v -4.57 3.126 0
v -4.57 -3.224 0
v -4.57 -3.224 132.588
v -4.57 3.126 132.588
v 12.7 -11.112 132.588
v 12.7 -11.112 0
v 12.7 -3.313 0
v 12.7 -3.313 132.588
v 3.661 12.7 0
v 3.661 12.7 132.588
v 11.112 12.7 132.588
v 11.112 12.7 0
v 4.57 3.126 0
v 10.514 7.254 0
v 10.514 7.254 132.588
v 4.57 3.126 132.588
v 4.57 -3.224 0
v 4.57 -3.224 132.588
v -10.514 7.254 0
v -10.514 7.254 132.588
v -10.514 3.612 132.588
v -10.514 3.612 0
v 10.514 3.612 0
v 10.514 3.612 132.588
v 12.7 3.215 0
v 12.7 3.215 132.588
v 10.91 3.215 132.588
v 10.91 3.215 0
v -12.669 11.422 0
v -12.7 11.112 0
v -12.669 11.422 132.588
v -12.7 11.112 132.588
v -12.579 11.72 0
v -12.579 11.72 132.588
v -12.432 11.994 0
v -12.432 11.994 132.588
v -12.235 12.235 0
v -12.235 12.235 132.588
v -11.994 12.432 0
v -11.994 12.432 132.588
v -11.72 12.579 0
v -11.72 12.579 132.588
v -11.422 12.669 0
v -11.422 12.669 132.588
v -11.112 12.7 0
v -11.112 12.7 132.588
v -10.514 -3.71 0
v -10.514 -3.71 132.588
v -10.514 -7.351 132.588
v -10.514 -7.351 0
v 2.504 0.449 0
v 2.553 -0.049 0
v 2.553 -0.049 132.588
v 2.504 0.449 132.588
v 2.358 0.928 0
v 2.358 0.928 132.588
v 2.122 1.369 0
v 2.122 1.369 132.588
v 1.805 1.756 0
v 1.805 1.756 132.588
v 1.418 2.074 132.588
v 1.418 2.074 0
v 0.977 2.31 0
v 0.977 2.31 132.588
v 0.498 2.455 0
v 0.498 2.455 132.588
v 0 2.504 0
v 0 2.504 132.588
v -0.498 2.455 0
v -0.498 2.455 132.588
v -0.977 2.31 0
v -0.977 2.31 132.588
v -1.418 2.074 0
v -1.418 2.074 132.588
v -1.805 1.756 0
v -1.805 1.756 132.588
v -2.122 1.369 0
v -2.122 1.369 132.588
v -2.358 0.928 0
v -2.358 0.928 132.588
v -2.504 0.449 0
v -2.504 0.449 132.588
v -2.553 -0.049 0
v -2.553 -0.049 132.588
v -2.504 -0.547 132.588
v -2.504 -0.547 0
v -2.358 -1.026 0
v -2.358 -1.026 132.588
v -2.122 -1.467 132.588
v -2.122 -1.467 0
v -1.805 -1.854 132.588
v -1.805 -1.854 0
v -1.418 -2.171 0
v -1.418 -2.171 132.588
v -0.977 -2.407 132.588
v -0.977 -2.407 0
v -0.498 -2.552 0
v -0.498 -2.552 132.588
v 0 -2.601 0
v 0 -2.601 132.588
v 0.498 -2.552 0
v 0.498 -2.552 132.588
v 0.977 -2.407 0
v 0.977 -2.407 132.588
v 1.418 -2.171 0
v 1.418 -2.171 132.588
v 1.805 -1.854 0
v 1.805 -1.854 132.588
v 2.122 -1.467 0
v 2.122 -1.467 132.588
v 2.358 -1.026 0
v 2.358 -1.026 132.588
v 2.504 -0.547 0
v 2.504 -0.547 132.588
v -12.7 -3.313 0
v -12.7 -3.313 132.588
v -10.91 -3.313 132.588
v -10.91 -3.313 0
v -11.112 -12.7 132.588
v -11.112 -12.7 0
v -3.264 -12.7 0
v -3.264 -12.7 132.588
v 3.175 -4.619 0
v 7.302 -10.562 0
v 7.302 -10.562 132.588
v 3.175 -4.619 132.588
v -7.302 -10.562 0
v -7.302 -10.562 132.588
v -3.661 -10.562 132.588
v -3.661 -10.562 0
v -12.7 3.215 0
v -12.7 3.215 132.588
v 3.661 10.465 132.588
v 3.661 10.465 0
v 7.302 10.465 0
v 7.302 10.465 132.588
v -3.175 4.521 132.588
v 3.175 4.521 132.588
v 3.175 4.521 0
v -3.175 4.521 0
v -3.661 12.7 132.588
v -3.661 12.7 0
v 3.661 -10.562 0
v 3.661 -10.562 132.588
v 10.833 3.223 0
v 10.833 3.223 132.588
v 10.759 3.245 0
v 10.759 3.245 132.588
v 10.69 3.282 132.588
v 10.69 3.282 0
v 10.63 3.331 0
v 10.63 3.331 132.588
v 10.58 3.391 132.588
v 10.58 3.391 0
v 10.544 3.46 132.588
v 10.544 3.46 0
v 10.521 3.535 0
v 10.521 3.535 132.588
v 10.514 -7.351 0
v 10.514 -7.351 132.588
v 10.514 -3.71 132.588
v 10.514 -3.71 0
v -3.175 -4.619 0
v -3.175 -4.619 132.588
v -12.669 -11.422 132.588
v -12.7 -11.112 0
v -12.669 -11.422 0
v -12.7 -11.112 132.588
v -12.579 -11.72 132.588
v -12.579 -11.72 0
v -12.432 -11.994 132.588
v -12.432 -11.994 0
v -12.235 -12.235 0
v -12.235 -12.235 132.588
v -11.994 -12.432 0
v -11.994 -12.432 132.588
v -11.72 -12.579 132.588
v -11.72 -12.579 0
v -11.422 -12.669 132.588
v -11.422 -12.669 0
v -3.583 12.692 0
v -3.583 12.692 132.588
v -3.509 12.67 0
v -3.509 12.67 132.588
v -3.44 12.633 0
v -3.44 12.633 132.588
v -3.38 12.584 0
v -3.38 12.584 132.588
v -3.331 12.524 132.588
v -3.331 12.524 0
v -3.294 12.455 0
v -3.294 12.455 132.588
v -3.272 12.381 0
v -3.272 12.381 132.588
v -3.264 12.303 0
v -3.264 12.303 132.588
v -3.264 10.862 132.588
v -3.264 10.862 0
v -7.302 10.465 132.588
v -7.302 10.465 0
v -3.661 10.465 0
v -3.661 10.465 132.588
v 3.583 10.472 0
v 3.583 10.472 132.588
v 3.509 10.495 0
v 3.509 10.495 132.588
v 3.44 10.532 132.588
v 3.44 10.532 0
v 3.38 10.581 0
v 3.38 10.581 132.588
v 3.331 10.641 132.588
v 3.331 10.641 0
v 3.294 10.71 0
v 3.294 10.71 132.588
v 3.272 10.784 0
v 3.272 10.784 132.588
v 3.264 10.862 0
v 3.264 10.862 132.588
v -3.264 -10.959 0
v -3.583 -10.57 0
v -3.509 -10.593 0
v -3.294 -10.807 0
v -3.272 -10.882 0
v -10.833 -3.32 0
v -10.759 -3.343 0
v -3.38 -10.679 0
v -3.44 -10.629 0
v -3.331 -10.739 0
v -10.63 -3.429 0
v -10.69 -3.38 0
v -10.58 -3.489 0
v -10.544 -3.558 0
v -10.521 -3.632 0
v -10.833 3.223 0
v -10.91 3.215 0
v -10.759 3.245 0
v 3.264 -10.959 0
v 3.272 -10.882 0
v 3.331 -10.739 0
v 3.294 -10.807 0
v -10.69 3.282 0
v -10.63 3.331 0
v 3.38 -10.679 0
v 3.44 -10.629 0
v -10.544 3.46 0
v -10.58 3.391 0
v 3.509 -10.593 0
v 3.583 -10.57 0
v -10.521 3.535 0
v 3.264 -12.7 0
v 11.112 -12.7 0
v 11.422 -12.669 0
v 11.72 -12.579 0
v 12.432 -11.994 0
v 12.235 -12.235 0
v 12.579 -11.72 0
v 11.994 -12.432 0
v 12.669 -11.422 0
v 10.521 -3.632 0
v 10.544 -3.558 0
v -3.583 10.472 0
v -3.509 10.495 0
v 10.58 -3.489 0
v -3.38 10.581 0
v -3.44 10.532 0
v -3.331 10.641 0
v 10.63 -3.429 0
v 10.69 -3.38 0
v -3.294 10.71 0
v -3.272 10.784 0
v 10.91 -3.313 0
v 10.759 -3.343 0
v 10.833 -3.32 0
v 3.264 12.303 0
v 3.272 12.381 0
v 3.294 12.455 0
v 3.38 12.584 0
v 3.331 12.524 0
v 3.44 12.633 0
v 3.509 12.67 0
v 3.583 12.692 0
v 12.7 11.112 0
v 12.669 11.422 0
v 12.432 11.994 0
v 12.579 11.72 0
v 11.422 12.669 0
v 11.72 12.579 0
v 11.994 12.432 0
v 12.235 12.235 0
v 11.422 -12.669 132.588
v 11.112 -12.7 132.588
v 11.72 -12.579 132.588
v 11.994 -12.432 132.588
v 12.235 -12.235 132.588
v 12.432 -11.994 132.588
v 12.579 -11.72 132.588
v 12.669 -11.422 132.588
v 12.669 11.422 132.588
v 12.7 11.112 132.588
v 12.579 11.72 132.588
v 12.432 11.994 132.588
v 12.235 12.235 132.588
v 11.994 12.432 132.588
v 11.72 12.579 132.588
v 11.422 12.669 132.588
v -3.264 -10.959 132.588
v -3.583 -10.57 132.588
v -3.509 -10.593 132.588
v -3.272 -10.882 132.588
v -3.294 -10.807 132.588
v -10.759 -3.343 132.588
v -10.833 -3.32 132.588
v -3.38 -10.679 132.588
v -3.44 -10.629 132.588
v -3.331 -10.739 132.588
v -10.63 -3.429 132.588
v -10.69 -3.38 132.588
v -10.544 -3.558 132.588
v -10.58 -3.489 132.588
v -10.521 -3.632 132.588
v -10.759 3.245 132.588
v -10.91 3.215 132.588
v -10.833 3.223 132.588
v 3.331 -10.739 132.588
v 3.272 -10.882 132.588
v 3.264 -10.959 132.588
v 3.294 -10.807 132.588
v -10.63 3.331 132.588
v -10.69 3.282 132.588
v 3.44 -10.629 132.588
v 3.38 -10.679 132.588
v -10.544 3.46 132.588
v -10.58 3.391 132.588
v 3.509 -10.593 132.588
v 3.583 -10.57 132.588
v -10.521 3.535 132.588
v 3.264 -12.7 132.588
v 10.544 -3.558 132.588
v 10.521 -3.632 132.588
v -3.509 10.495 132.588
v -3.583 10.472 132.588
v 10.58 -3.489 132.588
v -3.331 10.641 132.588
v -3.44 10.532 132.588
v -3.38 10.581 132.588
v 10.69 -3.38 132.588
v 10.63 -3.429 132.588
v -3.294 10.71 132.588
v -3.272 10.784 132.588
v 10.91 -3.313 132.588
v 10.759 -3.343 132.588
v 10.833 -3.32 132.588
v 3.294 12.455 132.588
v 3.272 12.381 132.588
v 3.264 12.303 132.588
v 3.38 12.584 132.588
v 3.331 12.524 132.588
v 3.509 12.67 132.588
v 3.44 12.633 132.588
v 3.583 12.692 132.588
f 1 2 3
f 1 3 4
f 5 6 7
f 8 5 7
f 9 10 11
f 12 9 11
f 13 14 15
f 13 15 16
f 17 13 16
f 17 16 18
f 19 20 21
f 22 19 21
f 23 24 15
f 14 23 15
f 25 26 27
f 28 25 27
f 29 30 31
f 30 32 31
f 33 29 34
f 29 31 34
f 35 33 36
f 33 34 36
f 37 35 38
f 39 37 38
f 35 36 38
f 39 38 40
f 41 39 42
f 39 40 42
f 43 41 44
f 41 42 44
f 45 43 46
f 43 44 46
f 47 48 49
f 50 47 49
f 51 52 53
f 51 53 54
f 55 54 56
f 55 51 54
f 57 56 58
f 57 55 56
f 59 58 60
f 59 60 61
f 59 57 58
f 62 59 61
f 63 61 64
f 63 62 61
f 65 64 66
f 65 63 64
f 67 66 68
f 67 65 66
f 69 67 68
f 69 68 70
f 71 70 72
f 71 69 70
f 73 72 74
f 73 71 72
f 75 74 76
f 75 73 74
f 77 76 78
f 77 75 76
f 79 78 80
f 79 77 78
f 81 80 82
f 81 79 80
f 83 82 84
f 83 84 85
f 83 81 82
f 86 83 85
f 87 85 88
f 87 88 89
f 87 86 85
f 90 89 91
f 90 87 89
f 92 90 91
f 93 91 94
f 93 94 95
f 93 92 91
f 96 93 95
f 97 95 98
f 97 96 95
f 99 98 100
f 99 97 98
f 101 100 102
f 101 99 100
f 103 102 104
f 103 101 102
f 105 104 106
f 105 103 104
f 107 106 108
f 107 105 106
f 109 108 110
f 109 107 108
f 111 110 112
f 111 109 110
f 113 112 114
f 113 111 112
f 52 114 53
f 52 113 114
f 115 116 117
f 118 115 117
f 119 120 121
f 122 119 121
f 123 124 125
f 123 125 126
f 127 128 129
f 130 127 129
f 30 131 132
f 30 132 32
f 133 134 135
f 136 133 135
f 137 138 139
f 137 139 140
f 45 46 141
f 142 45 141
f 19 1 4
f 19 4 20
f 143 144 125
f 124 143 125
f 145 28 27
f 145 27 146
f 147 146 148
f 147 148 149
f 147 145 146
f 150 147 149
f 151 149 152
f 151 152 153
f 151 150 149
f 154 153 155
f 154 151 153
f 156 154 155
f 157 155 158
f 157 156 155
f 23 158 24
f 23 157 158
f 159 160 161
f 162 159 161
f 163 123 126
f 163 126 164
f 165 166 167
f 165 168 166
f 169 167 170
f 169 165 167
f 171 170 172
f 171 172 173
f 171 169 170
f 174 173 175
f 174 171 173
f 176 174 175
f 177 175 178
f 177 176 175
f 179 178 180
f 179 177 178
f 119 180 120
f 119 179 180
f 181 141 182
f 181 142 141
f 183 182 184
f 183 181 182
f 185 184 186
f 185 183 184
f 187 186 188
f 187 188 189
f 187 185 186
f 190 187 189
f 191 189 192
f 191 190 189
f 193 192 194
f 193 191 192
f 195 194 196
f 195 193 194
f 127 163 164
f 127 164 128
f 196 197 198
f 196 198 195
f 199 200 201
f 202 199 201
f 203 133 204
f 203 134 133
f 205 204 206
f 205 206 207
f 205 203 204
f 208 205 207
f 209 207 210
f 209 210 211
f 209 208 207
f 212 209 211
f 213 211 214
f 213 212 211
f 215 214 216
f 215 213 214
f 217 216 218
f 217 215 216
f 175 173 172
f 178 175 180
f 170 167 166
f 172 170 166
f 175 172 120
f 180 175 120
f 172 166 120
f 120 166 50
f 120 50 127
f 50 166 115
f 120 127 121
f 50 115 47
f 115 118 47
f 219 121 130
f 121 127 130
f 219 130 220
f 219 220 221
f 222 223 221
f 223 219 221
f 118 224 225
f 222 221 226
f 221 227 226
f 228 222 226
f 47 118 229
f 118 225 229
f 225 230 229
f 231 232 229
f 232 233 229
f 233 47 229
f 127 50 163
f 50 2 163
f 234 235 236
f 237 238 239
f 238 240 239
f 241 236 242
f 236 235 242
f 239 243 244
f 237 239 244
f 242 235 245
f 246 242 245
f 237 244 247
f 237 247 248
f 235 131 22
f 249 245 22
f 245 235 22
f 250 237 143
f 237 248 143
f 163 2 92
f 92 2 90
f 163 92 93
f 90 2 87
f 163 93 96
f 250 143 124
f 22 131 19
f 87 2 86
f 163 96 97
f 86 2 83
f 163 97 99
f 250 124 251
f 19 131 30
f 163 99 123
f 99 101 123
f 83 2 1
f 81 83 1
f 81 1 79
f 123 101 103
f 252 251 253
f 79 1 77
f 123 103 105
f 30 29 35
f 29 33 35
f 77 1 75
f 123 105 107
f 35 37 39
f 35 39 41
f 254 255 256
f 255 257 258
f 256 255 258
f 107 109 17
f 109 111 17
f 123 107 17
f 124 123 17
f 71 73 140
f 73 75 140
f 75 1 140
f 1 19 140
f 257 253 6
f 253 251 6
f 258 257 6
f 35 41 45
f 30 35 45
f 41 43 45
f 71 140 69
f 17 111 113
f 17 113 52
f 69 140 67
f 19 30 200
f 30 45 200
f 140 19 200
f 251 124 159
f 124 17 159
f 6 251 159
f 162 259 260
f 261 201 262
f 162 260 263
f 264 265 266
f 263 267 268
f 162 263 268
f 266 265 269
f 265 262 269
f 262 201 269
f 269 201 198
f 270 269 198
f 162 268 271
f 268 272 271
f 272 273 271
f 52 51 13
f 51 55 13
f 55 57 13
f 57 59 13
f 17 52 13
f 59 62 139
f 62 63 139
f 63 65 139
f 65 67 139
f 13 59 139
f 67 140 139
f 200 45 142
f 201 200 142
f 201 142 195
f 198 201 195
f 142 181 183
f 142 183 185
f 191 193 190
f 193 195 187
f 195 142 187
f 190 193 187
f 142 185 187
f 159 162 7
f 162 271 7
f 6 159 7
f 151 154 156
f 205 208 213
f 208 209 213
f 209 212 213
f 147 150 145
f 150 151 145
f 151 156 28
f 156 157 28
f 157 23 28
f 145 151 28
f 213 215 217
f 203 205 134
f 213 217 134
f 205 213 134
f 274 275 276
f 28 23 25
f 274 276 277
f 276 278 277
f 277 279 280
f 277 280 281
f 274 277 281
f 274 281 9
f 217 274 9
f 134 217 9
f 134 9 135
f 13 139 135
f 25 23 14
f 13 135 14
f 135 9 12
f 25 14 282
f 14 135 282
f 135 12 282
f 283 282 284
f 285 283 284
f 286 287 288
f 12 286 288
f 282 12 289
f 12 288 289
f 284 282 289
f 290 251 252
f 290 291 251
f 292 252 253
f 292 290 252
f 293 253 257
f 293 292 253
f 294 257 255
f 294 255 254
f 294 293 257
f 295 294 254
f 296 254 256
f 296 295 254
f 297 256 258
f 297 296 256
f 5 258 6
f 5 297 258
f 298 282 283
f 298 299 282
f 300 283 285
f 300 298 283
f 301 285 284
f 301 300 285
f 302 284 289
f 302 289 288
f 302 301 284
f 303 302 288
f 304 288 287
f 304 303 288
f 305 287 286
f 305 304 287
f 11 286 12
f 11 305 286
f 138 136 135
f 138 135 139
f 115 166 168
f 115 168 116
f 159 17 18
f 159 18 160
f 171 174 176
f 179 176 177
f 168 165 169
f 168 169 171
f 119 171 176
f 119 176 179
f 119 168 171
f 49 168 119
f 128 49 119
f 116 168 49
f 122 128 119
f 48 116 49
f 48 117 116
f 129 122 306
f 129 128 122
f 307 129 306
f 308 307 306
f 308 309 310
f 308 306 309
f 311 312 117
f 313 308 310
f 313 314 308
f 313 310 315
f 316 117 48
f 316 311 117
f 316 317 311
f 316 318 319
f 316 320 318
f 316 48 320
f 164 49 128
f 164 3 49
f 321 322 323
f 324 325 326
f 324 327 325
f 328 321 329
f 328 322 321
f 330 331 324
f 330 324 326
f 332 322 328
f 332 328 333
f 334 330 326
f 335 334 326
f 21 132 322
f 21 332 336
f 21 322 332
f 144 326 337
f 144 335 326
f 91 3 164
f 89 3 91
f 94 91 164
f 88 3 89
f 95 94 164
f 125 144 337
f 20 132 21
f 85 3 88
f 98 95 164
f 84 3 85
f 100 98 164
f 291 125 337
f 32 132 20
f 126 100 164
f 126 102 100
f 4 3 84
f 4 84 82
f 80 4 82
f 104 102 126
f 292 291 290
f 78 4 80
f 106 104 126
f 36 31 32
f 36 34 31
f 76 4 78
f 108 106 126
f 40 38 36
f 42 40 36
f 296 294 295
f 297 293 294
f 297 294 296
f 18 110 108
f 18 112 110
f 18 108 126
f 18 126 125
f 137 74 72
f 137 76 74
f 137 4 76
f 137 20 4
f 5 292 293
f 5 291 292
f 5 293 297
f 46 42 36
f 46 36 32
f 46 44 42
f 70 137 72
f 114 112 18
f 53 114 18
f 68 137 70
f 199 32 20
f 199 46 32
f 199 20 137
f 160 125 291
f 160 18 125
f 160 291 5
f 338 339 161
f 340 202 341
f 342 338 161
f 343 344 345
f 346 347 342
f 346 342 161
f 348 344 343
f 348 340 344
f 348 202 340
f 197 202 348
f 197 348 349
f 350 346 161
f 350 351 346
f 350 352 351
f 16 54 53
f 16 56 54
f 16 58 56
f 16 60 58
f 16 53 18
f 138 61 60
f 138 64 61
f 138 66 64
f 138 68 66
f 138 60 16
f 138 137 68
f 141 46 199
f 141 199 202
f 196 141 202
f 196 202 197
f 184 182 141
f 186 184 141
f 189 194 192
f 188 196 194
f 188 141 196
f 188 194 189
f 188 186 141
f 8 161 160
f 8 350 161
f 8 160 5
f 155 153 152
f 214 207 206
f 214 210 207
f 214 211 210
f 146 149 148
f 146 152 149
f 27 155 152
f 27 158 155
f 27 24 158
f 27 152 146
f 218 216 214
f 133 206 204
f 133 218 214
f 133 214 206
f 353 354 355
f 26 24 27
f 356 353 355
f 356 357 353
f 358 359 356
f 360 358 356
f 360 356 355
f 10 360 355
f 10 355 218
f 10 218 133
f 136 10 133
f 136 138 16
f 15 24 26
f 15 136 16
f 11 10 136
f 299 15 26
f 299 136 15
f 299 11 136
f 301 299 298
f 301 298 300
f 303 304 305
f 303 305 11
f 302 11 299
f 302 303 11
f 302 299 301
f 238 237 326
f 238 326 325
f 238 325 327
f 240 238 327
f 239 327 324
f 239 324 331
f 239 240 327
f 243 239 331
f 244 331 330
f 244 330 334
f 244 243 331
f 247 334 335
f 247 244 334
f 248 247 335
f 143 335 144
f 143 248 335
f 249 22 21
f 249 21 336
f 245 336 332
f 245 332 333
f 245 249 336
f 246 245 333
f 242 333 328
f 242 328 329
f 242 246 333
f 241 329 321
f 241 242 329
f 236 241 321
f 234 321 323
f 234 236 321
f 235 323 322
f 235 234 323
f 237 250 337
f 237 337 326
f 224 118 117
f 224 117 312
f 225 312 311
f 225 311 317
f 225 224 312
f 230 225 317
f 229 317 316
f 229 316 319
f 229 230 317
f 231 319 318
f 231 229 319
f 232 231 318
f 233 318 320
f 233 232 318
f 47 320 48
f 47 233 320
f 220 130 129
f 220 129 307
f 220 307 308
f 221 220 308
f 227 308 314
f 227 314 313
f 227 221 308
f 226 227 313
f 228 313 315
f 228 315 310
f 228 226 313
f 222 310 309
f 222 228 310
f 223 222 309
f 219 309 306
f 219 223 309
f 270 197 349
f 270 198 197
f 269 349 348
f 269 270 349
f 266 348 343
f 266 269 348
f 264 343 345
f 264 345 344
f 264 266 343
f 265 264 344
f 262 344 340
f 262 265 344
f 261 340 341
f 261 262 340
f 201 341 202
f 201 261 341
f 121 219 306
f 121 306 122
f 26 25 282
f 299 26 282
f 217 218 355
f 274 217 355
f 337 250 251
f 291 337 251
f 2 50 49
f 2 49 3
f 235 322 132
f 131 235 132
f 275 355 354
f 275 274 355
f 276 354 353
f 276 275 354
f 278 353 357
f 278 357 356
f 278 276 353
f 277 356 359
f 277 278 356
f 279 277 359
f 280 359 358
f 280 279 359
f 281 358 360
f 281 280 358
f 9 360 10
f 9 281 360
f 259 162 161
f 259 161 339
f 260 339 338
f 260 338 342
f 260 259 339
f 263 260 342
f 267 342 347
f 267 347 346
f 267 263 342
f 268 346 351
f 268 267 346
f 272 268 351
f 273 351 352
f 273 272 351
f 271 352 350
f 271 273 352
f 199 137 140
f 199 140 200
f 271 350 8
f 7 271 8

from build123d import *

# Parameters (mm, degrees)
SKETCH1_W           = 25.4
SKETCH1_H           = 25.4
BOSS_EXTRUDE1_DEPTH = 132.588
FILLET1_R           = 1.5875
HOLE1_OUTLINE_R     = 2.5527
HOLE1_DEPTH         = 132.588
SKETCH7_W           = 6.5278
SKETCH7_H           = 2.2352
CUT_EXTRUDE2_DEPTH  = 132.588
FILLET4_R           = 0.396875
CIRPATTERN2_DEPTH   = 132.588


# Read off the part's stored shape, not the designer's step: Hole1, CirPattern2
with BuildPart() as part:
    # Sketch1 → Boss-Extrude1 (new body)
    with BuildSketch(Plane.XY):
        Rectangle(SKETCH1_W, SKETCH1_H)
    extrude(amount=BOSS_EXTRUDE1_DEPTH)

    # Fillet1
    fillet1_edges = [part.edges().sort_by_distance(p)[0] for p in [
        (12.7, -12.7, 66.294),
        (-12.7, -12.7, 66.294),
        (-12.7, 12.7, 66.294),
        (12.7, 12.7, 66.294),
    ]]
    fillet(fillet1_edges, radius=FILLET1_R)

    # Hole1 outline → Hole1 (cut)
    with BuildSketch(Plane.XY):
        with Locations((0, -0.048792482)):
            Circle(HOLE1_OUTLINE_R)
    extrude(amount=HOLE1_DEPTH, mode=Mode.SUBTRACT)

    # Sketch7 → Cut-Extrude2 (cut)
    with BuildSketch(Plane.XY.offset(132.588)):
        with Locations((0, 11.5824)):
            Rectangle(SKETCH7_W, SKETCH7_H)
        Polygon((-3.175, 4.5212), (-7.3025, 10.4648), (7.3025, 10.4648), (3.175, 4.5212), align=None)
    extrude(amount=-CUT_EXTRUDE2_DEPTH, mode=Mode.SUBTRACT)

    # Fillet4
    fillet4_edges = [part.edges().sort_by_distance(p)[0] for p in [
        (-3.2639, 10.4648, 66.294),
        (-3.2639, 12.7, 66.294),
        (3.2639, 12.7, 66.294),
        (3.2639, 10.4648, 66.294),
    ]]
    fillet(fillet4_edges, radius=FILLET4_R)

    # CirPattern2 outline → CirPattern2 (cut)
    with BuildSketch(Plane.XY):
        with BuildLine():
            ThreePointArc((-3.660775, -10.562384964), (-3.380141996, -10.67862696), (-3.2639, -10.959259964))
            Line((-3.2639, -10.959259964), (-3.2639, -12.7))
            Line((-3.2639, -12.7), (3.2639, -12.7))
            Line((3.2639, -12.7), (3.2639, -10.959259964))
            ThreePointArc((3.2639, -10.959259964), (3.380141996, -10.67862696), (3.660775, -10.562384964))
            Line((3.660775, -10.562384964), (7.3025, -10.562384964))
            Line((7.3025, -10.562384964), (3.175, -4.618784964))
            Line((3.175, -4.618784964), (-3.175, -4.618784964))
            Line((-3.175, -4.618784964), (-7.3025, -10.562384964))
            Line((-7.3025, -10.562384964), (-3.660775, -10.562384964))
        make_face()
        with BuildLine():
            Line((-12.7, -3.312692482), (-10.910467482, -3.312692482))
            ThreePointArc((-10.910467482, -3.312692482), (-10.629834478, -3.428934478), (-10.513592482, -3.709567482))
            Line((-10.513592482, -3.709567482), (-10.513592482, -7.351292482))
            Line((-10.513592482, -7.351292482), (-4.569992482, -3.223792482))
            Line((-4.569992482, -3.223792482), (-4.569992482, 3.126207518))
            Line((-4.569992482, 3.126207518), (-10.513592482, 7.253707518))
            Line((-10.513592482, 7.253707518), (-10.513592482, 3.611982518))
            ThreePointArc((-10.513592482, 3.611982518), (-10.629834478, 3.331349514), (-10.910467482, 3.215107518))
            Line((-10.910467482, 3.215107518), (-12.7, 3.215107518))
            Line((-12.7, 3.215107518), (-12.7, -3.312692482))
        make_face()
        with BuildLine():
            ThreePointArc((10.513592482, -3.709567482), (10.629834478, -3.428934478), (10.910467482, -3.312692482))
            Line((10.910467482, -3.312692482), (12.7, -3.312692482))
            Line((12.7, -3.312692482), (12.7, 3.215107518))
            Line((12.7, 3.215107518), (10.910467482, 3.215107518))
            ThreePointArc((10.910467482, 3.215107518), (10.629834478, 3.331349514), (10.513592482, 3.611982518))
            Line((10.513592482, 3.611982518), (10.513592482, 7.253707518))
            Line((10.513592482, 7.253707518), (4.569992482, 3.126207518))
            Line((4.569992482, 3.126207518), (4.569992482, -3.223792482))
            Line((4.569992482, -3.223792482), (10.513592482, -7.351292482))
            Line((10.513592482, -7.351292482), (10.513592482, -3.709567482))
        make_face()
    extrude(amount=CIRPATTERN2_DEPTH, mode=Mode.SUBTRACT)


solid = part.part
